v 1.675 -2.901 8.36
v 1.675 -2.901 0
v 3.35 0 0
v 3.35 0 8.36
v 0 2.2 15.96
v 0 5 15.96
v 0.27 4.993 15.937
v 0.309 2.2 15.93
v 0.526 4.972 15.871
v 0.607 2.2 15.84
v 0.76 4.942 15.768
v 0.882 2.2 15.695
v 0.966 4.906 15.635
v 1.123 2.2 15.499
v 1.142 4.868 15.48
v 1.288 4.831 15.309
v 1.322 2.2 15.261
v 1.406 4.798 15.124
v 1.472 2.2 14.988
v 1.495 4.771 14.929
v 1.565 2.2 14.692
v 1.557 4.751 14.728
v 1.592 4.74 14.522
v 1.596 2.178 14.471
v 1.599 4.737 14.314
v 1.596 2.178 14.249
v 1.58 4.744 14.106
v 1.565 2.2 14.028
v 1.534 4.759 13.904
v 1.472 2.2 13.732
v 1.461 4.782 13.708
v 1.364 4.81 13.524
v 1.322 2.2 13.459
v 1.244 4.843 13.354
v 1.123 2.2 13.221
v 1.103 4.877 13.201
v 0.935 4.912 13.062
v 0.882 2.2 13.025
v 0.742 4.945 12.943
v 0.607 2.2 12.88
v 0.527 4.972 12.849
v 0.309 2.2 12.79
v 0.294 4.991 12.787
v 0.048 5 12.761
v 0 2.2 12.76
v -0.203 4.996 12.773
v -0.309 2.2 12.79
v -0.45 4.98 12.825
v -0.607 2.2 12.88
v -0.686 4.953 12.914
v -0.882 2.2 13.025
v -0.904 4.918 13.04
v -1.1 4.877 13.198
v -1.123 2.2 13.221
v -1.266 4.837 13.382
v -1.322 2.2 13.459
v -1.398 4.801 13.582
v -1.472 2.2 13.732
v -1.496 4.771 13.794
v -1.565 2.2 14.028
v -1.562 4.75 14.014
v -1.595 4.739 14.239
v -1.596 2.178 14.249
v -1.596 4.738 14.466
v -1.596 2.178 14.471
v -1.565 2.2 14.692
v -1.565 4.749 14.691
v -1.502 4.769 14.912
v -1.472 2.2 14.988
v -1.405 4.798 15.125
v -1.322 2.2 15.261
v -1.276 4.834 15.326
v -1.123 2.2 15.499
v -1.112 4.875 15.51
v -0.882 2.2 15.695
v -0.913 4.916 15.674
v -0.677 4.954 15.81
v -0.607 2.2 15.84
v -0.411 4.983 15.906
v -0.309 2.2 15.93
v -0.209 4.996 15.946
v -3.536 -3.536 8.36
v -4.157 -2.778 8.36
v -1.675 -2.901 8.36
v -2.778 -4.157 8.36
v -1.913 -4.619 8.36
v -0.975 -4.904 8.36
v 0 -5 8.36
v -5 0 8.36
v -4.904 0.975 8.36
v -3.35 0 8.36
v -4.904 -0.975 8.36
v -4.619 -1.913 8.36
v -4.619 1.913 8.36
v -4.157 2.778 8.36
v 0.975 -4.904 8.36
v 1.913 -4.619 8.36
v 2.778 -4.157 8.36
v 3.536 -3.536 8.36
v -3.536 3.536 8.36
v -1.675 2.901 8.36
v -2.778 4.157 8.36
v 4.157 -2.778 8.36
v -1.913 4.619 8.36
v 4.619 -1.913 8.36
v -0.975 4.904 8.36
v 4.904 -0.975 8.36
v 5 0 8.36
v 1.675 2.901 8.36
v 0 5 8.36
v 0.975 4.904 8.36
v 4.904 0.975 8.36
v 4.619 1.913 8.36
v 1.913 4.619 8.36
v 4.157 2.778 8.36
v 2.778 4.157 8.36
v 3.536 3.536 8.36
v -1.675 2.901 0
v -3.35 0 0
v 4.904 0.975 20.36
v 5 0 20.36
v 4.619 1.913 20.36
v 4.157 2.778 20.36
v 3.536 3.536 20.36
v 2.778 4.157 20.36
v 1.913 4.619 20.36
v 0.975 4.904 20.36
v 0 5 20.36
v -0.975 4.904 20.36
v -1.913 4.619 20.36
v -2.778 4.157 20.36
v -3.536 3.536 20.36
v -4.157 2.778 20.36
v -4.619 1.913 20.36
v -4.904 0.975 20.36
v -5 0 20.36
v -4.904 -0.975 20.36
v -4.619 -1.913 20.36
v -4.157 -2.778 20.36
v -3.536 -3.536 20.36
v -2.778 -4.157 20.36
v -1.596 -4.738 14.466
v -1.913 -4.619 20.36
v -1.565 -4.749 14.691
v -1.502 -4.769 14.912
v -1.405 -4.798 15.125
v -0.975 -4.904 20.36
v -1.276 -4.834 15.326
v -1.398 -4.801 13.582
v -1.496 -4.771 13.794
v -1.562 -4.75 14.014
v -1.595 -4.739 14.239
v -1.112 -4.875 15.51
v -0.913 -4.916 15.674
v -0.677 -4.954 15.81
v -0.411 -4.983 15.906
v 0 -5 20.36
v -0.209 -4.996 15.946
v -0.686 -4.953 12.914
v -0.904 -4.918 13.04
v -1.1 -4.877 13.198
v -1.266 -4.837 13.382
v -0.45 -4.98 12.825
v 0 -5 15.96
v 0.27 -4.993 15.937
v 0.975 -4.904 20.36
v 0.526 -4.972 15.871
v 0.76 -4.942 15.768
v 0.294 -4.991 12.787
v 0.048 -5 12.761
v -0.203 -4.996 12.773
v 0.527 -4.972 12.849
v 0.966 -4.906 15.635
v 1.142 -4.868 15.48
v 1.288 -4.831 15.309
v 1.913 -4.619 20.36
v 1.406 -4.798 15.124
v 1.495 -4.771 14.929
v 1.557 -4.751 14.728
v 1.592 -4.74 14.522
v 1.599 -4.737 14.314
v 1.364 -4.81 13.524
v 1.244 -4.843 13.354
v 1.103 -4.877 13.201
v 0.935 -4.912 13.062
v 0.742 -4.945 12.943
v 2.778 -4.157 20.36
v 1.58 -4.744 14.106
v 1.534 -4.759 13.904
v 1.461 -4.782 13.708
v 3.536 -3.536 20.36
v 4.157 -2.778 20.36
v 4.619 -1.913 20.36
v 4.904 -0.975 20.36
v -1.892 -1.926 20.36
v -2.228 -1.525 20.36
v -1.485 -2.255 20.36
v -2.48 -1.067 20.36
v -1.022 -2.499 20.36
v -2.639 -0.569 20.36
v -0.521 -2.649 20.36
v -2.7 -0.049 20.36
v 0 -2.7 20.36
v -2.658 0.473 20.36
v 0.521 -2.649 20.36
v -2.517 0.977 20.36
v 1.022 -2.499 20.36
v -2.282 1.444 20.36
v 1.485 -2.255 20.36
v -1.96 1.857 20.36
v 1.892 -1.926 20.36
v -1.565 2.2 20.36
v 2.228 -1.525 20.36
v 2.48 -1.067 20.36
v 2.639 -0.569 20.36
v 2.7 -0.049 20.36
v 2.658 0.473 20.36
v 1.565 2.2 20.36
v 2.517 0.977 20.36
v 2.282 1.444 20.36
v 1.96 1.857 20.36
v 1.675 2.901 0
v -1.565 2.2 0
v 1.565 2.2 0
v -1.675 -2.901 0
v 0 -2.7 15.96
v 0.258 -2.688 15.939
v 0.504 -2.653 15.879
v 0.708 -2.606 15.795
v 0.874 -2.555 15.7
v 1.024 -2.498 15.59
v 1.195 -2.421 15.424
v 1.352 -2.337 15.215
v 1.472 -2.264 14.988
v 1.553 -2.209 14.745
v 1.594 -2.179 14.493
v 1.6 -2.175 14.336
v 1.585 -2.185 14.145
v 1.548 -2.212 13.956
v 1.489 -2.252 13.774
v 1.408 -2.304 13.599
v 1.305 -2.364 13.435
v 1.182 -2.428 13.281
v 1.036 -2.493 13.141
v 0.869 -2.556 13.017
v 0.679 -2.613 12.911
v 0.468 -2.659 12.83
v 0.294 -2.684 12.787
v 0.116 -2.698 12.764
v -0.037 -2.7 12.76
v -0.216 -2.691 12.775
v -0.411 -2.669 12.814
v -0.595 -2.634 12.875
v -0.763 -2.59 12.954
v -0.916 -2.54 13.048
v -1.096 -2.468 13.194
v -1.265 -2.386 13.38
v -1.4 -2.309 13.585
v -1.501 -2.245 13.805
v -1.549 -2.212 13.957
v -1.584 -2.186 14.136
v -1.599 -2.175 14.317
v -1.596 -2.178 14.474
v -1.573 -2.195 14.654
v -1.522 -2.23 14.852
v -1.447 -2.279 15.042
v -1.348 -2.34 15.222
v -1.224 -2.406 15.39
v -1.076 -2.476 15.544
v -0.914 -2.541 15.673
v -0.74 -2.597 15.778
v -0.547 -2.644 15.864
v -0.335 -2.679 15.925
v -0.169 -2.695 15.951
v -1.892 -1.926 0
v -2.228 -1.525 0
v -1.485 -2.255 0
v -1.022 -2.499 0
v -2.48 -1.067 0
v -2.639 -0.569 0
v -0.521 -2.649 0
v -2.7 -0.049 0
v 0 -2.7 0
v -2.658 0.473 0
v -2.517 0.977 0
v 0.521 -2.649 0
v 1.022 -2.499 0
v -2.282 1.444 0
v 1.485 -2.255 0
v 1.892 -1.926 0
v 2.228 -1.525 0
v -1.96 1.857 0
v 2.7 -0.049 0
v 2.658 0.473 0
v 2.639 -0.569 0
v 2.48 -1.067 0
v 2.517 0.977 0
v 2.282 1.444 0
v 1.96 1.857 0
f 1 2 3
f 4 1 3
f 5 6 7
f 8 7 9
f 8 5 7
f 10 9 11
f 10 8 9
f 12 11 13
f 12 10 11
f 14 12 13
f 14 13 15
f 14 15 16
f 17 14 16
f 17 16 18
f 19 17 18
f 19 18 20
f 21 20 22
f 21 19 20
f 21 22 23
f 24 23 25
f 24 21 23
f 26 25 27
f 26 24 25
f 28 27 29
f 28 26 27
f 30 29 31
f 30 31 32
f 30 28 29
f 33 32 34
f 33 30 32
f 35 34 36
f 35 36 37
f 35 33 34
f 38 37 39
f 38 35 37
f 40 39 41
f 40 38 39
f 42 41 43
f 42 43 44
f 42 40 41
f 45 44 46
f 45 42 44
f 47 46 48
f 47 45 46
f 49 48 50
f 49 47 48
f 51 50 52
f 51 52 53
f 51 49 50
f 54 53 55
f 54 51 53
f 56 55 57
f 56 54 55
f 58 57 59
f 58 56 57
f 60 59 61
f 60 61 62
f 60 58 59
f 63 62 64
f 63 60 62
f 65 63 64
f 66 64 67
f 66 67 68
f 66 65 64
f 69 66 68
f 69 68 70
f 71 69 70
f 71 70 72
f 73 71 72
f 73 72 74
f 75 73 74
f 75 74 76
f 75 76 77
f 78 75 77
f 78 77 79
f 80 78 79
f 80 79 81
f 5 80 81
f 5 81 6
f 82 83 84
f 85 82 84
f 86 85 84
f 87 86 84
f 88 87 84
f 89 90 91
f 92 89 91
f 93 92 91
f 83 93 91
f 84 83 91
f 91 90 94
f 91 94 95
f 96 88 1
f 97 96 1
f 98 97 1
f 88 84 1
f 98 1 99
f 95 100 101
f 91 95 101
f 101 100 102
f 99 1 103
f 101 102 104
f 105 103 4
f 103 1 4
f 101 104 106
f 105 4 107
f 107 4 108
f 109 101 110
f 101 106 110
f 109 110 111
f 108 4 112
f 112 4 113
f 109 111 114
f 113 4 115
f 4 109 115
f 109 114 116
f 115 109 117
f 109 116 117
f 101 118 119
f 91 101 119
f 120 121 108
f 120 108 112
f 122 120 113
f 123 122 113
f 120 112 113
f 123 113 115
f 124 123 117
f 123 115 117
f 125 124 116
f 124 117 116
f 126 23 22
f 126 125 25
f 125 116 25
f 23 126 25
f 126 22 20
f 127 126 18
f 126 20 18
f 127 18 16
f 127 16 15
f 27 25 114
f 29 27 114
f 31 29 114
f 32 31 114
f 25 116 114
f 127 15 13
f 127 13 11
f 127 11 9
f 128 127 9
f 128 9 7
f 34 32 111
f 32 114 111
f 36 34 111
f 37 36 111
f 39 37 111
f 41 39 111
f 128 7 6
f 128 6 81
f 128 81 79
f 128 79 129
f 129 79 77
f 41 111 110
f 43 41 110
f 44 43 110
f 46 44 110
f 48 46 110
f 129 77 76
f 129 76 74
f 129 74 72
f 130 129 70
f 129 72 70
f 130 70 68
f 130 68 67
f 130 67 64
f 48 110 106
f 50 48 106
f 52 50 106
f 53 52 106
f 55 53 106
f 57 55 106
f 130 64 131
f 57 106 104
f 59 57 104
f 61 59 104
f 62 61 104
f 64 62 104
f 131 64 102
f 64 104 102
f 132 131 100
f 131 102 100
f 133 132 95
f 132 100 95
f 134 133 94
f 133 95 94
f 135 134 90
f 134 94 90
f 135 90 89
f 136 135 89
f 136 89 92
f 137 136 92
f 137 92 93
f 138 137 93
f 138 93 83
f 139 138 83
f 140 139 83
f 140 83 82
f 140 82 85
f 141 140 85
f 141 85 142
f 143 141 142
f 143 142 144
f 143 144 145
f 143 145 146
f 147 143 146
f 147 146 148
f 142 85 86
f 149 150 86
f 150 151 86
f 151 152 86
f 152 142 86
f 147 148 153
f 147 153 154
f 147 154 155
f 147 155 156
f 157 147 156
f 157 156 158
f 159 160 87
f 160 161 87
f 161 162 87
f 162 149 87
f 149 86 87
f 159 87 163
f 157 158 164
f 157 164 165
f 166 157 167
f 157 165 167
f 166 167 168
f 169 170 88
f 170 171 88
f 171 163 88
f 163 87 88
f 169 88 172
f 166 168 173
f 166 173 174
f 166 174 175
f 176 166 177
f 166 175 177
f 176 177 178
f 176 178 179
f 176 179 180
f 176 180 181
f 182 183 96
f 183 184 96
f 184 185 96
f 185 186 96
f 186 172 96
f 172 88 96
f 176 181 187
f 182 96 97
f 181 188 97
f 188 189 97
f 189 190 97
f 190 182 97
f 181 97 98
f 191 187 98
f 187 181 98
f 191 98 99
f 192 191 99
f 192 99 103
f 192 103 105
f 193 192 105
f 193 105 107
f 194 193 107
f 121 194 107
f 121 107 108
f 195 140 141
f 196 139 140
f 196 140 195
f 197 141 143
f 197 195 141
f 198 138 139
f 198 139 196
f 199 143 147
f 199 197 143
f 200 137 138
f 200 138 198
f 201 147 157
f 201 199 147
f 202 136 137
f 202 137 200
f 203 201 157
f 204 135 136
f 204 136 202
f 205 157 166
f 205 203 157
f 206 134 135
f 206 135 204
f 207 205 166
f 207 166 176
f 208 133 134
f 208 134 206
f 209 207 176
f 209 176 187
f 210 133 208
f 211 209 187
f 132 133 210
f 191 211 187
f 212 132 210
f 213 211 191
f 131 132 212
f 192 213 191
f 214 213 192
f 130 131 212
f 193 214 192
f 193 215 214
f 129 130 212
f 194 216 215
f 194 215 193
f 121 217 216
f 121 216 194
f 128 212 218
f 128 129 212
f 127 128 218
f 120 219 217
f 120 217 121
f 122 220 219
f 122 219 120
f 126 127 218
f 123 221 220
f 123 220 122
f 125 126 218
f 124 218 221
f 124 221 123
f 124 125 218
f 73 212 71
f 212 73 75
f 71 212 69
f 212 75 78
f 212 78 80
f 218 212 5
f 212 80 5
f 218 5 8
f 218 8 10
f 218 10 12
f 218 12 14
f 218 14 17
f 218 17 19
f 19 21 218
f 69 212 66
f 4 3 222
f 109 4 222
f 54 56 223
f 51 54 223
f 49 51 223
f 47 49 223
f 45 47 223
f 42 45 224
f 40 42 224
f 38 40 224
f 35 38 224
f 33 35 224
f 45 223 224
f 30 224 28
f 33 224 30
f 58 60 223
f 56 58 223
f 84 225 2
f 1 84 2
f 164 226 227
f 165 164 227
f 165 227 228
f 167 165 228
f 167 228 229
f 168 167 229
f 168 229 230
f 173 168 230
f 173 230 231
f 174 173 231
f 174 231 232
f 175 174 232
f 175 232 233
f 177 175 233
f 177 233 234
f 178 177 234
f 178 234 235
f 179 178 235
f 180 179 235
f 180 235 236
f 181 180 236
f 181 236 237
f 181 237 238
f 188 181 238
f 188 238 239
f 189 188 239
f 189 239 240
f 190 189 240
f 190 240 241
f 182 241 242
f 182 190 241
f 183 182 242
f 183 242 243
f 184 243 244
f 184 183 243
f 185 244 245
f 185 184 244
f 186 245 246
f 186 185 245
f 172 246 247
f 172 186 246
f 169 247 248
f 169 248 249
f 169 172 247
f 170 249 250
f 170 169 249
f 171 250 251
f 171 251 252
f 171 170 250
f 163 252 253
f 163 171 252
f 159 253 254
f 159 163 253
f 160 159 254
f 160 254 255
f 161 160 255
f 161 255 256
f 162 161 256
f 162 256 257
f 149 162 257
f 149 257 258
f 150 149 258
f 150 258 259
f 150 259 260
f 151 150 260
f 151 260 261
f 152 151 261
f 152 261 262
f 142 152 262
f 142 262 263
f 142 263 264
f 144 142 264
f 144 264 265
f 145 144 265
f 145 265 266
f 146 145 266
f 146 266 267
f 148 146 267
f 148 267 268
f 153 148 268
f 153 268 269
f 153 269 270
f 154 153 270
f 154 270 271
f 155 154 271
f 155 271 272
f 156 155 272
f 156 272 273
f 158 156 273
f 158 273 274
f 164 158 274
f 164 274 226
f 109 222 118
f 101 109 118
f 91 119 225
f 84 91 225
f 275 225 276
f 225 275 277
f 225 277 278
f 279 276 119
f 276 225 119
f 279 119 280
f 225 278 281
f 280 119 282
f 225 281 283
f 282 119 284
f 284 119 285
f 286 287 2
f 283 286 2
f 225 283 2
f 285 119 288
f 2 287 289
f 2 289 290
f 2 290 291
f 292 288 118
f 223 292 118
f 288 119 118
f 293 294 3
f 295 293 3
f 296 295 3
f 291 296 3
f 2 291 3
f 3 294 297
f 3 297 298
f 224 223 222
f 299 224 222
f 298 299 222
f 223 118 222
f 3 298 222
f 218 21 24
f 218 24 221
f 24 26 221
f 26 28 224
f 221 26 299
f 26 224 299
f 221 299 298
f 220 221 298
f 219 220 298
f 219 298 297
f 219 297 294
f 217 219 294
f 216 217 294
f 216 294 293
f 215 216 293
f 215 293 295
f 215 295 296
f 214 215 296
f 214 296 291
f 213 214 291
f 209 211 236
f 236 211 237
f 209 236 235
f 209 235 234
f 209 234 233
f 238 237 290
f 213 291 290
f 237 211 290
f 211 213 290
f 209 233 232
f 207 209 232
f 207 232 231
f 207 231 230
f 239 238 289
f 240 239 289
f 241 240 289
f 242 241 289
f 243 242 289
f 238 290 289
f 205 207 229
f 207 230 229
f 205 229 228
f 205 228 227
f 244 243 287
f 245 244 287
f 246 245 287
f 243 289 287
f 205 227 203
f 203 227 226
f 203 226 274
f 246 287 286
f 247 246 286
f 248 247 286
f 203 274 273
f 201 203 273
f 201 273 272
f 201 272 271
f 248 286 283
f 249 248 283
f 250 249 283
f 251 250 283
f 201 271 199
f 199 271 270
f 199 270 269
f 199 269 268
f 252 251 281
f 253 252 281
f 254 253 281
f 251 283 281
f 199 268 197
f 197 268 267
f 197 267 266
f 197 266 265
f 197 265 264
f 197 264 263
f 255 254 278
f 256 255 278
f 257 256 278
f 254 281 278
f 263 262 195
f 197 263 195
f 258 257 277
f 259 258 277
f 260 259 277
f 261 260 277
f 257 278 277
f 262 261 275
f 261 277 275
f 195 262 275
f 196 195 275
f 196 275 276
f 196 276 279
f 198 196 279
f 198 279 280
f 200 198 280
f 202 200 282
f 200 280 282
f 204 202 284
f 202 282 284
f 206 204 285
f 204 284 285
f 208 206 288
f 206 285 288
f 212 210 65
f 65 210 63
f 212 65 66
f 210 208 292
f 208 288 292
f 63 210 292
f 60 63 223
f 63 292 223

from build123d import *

# Parameters (mm, degrees)
BOSS_EXTRUDE1_DEPTH     = 8.36
SKETCH3_R               = 5
BOSS_EXTRUDE2_DEPTH     = 12
CUT_EXTRUDE2_DEPTH      = 22.552948754
CUT_EXTRUDE2_DEPTH_BACK = 22.552948754
CUT_EXTRUDE3_DEPTH      = 22.552948754
CUT_EXTRUDE3_DEPTH_BACK = 22.552948754
SKETCH5_R               = 1.6


with BuildPart() as part:
    # Sketch1 → Boss-Extrude1 (new body)
    with BuildSketch(Plane.XY):
        Polygon((-1.675, 2.901185103), (-3.35, 0), (-1.675, -2.901185103), (1.675, -2.901185103), (3.35, 0), (1.675, 2.901185103), align=None)
    extrude(amount=BOSS_EXTRUDE1_DEPTH)

    # Sketch3 → Boss-Extrude2 (add)
    with BuildSketch(Plane.XY.offset(8.36)):
        Circle(SKETCH3_R)
    extrude(amount=BOSS_EXTRUDE2_DEPTH)

    # Sketch4 → Cut-Extrude2 (cut, two sides: drawn at the far end of the back side and taken through both)
    with BuildSketch(Plane.XY.offset(20.36).offset(-CUT_EXTRUDE2_DEPTH_BACK)):
        with BuildLine():
            Line((-1.565247584, 2.2), (1.565247584, 2.2))
            ThreePointArc((1.565247584, 2.2), (0, -2.7), (-1.565247584, 2.2))
        make_face()
    extrude(amount=CUT_EXTRUDE2_DEPTH + CUT_EXTRUDE2_DEPTH_BACK, mode=Mode.SUBTRACT)

    # Sketch5 → Cut-Extrude3 (cut, two sides: drawn at the far end of the back side and taken through both)
    with BuildSketch(Plane(origin=(0, 0, 0), x_dir=(1, 0, 0), z_dir=(0, 1, 0)).offset(-CUT_EXTRUDE3_DEPTH_BACK)):
        with Locations(Location((0, -14.36, 0), (0, 0, 270))):
            Circle(SKETCH5_R)
    extrude(amount=CUT_EXTRUDE3_DEPTH + CUT_EXTRUDE3_DEPTH_BACK, mode=Mode.SUBTRACT)


solid = part.part
